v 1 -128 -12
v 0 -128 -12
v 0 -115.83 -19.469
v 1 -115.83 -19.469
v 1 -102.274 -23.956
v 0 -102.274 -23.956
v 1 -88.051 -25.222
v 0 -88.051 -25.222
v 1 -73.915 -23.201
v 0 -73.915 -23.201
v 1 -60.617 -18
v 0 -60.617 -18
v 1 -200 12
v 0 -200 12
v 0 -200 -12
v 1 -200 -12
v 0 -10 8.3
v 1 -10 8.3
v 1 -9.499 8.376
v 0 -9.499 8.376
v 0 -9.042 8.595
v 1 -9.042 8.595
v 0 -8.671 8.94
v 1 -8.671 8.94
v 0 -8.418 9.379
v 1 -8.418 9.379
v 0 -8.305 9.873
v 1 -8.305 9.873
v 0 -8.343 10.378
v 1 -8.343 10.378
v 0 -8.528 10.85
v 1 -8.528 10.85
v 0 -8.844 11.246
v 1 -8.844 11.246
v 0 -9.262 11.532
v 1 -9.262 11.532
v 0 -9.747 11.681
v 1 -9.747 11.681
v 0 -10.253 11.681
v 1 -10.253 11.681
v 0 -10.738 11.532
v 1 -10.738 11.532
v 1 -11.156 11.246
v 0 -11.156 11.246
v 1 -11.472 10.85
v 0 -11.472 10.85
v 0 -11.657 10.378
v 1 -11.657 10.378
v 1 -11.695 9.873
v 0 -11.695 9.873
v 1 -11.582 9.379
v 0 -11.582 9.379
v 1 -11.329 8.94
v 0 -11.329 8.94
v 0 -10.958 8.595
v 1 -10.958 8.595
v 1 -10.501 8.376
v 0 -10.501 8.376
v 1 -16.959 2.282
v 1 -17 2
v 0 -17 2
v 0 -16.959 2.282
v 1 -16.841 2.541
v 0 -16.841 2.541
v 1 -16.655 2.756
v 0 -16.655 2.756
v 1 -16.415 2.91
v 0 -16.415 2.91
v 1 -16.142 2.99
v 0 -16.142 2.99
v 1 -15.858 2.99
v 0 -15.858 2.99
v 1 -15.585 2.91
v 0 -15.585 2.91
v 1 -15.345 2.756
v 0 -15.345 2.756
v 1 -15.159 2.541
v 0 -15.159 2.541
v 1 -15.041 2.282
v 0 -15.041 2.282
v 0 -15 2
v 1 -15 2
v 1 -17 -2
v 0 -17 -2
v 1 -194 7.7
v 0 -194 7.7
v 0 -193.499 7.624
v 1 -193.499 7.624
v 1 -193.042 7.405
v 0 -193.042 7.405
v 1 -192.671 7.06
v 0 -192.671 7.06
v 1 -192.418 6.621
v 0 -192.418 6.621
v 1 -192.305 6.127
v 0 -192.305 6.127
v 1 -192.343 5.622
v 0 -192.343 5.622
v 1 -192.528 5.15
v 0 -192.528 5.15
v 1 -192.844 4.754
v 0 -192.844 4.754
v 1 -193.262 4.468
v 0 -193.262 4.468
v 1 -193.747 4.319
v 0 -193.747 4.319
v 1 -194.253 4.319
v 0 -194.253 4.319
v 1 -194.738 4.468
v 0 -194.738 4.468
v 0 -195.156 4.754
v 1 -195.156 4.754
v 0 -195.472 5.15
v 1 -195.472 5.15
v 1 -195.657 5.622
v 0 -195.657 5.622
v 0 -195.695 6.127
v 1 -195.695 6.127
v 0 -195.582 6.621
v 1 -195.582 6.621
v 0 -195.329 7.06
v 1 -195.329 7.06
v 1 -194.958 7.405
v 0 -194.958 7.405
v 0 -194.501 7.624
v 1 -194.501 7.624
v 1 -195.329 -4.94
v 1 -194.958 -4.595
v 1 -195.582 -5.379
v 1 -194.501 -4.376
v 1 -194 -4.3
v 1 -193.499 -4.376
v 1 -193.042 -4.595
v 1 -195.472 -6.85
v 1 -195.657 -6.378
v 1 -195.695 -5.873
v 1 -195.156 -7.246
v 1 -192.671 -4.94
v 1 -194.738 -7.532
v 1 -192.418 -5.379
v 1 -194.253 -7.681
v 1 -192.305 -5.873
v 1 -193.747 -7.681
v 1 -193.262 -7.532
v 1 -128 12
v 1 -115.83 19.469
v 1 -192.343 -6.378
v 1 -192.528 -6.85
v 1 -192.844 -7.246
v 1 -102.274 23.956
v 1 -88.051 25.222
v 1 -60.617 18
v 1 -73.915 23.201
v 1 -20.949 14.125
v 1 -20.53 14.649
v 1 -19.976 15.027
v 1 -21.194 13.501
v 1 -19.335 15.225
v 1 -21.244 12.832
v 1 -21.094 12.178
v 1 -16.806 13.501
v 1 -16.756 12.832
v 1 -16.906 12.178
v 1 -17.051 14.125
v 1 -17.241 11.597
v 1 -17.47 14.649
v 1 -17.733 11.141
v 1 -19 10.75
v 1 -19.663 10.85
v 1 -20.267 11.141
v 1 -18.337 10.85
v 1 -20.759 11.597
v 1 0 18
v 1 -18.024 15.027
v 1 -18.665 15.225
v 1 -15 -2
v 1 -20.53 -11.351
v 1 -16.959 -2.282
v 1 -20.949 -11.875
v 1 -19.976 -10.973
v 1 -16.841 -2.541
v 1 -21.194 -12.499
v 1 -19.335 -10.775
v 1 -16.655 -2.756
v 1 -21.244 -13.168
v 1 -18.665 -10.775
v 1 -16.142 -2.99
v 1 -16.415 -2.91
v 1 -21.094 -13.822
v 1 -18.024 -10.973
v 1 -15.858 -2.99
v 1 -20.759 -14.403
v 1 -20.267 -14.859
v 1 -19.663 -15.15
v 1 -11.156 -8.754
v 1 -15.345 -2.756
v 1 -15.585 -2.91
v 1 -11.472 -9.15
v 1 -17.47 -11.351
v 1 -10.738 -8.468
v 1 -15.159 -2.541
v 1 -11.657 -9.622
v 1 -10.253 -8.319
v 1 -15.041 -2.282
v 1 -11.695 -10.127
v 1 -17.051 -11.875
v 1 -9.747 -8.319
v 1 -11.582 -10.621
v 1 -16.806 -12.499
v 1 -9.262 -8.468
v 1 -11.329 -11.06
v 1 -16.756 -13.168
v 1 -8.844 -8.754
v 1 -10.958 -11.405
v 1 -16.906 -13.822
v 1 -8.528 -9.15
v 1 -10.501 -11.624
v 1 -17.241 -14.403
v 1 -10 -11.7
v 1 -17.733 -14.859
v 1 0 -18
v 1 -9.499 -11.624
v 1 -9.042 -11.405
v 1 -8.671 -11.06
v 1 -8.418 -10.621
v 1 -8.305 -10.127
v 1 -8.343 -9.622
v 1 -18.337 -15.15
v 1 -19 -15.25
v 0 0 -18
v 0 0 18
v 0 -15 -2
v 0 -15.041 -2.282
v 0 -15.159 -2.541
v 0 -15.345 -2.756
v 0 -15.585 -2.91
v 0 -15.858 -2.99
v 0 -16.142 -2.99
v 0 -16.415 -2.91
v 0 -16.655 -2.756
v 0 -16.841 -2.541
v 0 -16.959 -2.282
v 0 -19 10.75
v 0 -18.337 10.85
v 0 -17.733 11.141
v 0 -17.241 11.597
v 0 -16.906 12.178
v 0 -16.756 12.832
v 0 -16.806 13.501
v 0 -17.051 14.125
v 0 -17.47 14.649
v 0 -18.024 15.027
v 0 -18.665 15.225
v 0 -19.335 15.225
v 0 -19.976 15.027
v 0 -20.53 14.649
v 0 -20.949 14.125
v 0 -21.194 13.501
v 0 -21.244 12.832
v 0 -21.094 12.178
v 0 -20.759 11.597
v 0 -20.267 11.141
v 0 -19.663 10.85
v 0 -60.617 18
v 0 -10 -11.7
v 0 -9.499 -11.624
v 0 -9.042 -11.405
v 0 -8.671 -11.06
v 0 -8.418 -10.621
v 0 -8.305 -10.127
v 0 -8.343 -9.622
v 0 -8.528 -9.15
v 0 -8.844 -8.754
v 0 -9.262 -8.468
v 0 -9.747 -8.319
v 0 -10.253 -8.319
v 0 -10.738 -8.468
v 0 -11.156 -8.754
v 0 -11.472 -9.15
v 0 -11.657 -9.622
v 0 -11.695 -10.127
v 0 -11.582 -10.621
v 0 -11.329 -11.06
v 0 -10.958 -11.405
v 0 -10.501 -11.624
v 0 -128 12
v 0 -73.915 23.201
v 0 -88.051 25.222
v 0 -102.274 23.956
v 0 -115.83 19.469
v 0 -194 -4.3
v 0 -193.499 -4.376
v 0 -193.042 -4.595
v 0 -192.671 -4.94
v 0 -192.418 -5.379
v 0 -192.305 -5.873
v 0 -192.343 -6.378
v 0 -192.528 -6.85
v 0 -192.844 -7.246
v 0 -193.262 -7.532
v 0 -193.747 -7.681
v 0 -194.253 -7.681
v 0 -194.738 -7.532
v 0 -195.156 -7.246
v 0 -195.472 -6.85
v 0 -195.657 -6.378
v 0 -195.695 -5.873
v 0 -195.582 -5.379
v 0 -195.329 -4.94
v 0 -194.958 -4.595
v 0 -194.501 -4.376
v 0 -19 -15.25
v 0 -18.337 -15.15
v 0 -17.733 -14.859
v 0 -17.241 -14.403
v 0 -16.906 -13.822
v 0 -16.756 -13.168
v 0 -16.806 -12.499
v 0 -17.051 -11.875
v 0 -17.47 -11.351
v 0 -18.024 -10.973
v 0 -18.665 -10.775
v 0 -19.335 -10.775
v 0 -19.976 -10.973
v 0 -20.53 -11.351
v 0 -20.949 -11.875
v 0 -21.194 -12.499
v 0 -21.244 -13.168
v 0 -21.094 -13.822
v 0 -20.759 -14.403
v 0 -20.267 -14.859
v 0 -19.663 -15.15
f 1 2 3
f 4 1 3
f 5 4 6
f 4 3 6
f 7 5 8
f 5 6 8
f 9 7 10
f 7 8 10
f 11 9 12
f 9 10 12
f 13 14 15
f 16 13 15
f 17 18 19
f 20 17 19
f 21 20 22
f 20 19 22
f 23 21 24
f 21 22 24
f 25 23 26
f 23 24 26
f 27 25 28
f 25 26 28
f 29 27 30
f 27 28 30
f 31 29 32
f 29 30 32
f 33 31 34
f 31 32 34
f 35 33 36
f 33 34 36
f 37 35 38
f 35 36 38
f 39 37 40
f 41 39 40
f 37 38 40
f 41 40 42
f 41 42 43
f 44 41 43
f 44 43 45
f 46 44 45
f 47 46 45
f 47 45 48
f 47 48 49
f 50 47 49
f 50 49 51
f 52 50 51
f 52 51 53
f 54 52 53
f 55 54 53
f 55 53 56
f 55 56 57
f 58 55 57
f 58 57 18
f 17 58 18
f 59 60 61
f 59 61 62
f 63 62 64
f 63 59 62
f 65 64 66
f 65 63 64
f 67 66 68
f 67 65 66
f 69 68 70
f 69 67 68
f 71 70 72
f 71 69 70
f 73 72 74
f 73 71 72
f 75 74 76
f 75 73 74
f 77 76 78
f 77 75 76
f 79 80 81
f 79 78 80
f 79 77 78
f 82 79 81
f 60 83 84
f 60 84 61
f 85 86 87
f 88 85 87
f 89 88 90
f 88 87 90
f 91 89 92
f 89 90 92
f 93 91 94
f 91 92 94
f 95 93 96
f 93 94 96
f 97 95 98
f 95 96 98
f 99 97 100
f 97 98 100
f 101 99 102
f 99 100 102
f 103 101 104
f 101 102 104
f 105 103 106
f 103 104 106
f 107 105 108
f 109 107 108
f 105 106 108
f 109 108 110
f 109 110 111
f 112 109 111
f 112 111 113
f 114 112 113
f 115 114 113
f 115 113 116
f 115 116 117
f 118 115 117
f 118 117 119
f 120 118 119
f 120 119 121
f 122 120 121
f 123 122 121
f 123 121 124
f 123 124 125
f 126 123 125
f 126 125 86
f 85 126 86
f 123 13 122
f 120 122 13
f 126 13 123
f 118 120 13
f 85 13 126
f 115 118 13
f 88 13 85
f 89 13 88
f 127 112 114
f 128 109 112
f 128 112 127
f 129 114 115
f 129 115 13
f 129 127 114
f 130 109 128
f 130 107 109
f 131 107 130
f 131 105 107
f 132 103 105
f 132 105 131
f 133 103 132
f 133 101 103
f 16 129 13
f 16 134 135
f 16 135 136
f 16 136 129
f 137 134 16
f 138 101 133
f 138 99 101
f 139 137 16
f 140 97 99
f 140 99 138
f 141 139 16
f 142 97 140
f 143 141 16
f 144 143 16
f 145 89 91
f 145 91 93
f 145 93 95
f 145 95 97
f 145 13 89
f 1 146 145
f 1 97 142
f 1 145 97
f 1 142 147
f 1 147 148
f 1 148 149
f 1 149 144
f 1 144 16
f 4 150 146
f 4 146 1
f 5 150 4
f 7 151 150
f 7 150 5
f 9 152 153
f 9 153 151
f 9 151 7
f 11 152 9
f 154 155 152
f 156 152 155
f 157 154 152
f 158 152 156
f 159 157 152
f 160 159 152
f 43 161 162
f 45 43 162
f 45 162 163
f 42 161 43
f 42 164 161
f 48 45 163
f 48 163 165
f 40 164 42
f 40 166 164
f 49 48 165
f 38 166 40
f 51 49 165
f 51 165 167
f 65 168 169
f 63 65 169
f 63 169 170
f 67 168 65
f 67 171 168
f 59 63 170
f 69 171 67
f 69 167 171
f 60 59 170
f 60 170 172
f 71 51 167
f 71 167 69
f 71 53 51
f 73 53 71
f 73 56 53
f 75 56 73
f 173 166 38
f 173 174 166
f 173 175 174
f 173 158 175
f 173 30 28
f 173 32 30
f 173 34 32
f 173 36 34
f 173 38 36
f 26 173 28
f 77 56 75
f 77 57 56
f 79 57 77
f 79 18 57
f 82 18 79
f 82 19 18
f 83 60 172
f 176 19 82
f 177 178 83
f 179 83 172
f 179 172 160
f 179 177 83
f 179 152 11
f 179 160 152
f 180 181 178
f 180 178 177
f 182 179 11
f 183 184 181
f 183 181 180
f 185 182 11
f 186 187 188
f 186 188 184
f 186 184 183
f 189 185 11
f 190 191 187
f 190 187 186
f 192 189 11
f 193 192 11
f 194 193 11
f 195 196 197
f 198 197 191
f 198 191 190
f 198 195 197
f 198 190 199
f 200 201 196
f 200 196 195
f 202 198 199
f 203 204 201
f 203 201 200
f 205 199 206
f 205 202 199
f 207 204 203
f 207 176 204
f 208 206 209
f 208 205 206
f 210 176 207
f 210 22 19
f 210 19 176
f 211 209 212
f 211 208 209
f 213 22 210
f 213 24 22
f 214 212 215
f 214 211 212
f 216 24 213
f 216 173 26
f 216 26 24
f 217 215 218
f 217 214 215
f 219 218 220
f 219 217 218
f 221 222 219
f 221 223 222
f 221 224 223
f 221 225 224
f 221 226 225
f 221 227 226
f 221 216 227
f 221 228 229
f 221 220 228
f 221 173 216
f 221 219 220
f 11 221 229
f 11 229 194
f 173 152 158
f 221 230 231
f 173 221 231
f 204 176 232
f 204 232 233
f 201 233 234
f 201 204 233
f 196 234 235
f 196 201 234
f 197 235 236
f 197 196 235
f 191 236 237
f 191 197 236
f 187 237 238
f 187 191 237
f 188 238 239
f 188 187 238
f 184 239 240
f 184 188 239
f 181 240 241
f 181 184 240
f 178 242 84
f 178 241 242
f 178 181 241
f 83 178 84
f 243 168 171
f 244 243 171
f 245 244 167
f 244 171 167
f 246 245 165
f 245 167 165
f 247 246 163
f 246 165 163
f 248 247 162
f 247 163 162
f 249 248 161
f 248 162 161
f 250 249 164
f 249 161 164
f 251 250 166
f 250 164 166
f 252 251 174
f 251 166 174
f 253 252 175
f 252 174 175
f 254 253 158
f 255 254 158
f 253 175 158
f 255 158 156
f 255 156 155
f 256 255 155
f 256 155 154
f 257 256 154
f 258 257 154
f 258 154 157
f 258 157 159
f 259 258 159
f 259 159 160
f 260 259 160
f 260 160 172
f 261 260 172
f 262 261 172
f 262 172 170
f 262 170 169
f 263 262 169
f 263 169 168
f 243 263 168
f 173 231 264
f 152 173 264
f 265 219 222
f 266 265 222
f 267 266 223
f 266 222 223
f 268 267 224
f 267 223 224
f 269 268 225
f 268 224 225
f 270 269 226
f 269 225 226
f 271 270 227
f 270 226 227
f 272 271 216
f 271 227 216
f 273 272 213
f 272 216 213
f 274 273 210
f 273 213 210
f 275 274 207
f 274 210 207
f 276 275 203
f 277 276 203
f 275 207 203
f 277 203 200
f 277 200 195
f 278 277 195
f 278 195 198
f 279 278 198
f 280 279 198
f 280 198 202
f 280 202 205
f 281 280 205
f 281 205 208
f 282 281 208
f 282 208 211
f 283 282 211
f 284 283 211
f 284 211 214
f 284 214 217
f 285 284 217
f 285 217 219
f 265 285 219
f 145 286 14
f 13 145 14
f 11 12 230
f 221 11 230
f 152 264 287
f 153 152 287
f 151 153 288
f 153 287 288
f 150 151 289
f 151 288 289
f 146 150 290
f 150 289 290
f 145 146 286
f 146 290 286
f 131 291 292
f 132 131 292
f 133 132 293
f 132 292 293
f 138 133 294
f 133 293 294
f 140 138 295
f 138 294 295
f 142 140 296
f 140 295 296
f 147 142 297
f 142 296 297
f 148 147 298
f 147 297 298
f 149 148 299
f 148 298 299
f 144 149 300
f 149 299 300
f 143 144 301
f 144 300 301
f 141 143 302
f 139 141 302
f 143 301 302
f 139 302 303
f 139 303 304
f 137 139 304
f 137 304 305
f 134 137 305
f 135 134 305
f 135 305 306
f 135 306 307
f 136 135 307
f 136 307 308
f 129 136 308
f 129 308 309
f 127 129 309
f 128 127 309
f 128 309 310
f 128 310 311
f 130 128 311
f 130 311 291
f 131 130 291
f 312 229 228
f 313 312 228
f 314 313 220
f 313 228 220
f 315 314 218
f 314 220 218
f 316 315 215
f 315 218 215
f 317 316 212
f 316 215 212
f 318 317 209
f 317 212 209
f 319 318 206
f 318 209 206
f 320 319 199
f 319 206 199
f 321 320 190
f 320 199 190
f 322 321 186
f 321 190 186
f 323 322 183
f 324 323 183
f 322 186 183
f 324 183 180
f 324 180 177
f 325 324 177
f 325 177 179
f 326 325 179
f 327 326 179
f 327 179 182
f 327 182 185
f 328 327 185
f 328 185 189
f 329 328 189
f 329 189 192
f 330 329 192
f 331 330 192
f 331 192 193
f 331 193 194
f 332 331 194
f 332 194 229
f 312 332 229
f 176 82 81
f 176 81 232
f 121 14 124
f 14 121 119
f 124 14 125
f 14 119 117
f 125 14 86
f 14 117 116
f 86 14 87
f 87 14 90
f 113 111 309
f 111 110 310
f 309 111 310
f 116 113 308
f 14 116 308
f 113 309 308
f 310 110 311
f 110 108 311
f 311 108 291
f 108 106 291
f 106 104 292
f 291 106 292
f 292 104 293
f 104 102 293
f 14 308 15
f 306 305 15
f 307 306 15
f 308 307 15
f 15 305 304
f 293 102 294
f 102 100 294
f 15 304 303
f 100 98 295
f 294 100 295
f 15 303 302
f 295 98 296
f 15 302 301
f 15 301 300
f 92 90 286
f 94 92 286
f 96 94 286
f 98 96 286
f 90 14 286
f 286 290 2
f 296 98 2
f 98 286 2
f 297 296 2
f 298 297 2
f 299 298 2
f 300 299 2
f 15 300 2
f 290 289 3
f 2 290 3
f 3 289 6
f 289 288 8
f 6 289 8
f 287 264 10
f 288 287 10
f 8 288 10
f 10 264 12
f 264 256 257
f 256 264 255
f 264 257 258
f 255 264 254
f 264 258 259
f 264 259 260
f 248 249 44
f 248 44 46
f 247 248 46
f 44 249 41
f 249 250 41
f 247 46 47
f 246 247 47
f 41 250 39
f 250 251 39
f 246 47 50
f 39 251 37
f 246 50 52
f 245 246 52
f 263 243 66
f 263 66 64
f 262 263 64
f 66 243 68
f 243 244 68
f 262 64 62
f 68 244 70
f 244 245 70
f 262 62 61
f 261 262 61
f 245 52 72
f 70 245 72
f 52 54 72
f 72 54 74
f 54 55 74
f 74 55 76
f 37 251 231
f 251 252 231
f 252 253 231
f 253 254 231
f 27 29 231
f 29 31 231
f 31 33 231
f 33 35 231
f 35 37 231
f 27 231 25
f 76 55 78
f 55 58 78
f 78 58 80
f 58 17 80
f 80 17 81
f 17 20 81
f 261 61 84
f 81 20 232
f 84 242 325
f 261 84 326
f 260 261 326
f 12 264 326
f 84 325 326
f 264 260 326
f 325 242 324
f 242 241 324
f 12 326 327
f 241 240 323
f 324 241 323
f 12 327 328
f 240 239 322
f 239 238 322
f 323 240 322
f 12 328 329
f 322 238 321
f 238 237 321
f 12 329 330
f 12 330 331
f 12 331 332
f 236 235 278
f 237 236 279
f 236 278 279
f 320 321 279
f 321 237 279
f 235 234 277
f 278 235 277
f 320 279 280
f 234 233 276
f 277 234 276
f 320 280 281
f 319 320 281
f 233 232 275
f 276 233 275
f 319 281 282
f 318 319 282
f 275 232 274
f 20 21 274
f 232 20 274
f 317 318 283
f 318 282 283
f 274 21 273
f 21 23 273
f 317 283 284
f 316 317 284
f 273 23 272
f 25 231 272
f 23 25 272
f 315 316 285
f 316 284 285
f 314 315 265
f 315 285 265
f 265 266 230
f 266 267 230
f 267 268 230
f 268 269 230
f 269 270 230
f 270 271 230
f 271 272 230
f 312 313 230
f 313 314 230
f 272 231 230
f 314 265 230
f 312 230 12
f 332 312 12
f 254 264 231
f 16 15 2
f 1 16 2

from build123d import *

# Parameters (mm, degrees)
BOSS_EXTRUDE1_DEPTH  = 1
M3_CLEARANCE_HOLE1_D = 3.4
M4_CLEARANCE_HOLE1_D = 4.5
CUT_EXTRUDE1_DEPTH   = 202.589376266
M3_CLEARANCE_HOLE2_D = 3.4


with BuildPart() as part:
    # Sketch1 → Boss-Extrude1 (new body)
    with BuildSketch(Plane(origin=(0, 0, 0), x_dir=(0, 0, -1), z_dir=(1, 0, 0))):
        with BuildLine():
            Line((12, -200), (12, -128))
            ThreePointArc((12, -128), (25, -95.198992339), (18, -60.617116977))
            Line((18, -60.617116977), (18, 0))
            Line((18, 0), (-18, 0))
            Line((-18, 0), (-18, -60.617116977))
            ThreePointArc((-18, -60.617116977), (-25, -95.198992339), (-12, -128))
            Line((-12, -128), (-12, -200))
            Line((-12, -200), (12, -200))
        make_face()
    extrude(amount=BOSS_EXTRUDE1_DEPTH)

    # M3 Clearance Hole1 (through all)
    with Locations(Plane.ZY):
        with Locations((10, -10), (-10, -10)):
            Hole(M3_CLEARANCE_HOLE1_D / 2)

    # M4 Clearance Hole1 (through all)
    with Locations(Plane.ZY):
        with Locations((-13, -19), (13, -19)):
            Hole(M4_CLEARANCE_HOLE1_D / 2)

    # Sketch10 → Cut-Extrude1 (cut, through all)
    with BuildSketch(Plane(origin=(1, 0, 0), x_dir=(0, 0, -1), z_dir=(1, 0, 0))):
        with BuildLine():
            Line((-2, -15), (2, -15))
            ThreePointArc((2, -15), (3, -16), (2, -17))
            Line((2, -17), (-2, -17))
            ThreePointArc((-2, -17), (-3, -16), (-2, -15))
        make_face()
    extrude(amount=-CUT_EXTRUDE1_DEPTH, mode=Mode.SUBTRACT)

    # M3 Clearance Hole2 (through all)
    with Locations(Plane(origin=(1, 0, 0), x_dir=(0, 0, -1), z_dir=(1, 0, 0))):
        with Locations((-6, -194), (6, -194)):
            Hole(M3_CLEARANCE_HOLE2_D / 2)


solid = part.part
